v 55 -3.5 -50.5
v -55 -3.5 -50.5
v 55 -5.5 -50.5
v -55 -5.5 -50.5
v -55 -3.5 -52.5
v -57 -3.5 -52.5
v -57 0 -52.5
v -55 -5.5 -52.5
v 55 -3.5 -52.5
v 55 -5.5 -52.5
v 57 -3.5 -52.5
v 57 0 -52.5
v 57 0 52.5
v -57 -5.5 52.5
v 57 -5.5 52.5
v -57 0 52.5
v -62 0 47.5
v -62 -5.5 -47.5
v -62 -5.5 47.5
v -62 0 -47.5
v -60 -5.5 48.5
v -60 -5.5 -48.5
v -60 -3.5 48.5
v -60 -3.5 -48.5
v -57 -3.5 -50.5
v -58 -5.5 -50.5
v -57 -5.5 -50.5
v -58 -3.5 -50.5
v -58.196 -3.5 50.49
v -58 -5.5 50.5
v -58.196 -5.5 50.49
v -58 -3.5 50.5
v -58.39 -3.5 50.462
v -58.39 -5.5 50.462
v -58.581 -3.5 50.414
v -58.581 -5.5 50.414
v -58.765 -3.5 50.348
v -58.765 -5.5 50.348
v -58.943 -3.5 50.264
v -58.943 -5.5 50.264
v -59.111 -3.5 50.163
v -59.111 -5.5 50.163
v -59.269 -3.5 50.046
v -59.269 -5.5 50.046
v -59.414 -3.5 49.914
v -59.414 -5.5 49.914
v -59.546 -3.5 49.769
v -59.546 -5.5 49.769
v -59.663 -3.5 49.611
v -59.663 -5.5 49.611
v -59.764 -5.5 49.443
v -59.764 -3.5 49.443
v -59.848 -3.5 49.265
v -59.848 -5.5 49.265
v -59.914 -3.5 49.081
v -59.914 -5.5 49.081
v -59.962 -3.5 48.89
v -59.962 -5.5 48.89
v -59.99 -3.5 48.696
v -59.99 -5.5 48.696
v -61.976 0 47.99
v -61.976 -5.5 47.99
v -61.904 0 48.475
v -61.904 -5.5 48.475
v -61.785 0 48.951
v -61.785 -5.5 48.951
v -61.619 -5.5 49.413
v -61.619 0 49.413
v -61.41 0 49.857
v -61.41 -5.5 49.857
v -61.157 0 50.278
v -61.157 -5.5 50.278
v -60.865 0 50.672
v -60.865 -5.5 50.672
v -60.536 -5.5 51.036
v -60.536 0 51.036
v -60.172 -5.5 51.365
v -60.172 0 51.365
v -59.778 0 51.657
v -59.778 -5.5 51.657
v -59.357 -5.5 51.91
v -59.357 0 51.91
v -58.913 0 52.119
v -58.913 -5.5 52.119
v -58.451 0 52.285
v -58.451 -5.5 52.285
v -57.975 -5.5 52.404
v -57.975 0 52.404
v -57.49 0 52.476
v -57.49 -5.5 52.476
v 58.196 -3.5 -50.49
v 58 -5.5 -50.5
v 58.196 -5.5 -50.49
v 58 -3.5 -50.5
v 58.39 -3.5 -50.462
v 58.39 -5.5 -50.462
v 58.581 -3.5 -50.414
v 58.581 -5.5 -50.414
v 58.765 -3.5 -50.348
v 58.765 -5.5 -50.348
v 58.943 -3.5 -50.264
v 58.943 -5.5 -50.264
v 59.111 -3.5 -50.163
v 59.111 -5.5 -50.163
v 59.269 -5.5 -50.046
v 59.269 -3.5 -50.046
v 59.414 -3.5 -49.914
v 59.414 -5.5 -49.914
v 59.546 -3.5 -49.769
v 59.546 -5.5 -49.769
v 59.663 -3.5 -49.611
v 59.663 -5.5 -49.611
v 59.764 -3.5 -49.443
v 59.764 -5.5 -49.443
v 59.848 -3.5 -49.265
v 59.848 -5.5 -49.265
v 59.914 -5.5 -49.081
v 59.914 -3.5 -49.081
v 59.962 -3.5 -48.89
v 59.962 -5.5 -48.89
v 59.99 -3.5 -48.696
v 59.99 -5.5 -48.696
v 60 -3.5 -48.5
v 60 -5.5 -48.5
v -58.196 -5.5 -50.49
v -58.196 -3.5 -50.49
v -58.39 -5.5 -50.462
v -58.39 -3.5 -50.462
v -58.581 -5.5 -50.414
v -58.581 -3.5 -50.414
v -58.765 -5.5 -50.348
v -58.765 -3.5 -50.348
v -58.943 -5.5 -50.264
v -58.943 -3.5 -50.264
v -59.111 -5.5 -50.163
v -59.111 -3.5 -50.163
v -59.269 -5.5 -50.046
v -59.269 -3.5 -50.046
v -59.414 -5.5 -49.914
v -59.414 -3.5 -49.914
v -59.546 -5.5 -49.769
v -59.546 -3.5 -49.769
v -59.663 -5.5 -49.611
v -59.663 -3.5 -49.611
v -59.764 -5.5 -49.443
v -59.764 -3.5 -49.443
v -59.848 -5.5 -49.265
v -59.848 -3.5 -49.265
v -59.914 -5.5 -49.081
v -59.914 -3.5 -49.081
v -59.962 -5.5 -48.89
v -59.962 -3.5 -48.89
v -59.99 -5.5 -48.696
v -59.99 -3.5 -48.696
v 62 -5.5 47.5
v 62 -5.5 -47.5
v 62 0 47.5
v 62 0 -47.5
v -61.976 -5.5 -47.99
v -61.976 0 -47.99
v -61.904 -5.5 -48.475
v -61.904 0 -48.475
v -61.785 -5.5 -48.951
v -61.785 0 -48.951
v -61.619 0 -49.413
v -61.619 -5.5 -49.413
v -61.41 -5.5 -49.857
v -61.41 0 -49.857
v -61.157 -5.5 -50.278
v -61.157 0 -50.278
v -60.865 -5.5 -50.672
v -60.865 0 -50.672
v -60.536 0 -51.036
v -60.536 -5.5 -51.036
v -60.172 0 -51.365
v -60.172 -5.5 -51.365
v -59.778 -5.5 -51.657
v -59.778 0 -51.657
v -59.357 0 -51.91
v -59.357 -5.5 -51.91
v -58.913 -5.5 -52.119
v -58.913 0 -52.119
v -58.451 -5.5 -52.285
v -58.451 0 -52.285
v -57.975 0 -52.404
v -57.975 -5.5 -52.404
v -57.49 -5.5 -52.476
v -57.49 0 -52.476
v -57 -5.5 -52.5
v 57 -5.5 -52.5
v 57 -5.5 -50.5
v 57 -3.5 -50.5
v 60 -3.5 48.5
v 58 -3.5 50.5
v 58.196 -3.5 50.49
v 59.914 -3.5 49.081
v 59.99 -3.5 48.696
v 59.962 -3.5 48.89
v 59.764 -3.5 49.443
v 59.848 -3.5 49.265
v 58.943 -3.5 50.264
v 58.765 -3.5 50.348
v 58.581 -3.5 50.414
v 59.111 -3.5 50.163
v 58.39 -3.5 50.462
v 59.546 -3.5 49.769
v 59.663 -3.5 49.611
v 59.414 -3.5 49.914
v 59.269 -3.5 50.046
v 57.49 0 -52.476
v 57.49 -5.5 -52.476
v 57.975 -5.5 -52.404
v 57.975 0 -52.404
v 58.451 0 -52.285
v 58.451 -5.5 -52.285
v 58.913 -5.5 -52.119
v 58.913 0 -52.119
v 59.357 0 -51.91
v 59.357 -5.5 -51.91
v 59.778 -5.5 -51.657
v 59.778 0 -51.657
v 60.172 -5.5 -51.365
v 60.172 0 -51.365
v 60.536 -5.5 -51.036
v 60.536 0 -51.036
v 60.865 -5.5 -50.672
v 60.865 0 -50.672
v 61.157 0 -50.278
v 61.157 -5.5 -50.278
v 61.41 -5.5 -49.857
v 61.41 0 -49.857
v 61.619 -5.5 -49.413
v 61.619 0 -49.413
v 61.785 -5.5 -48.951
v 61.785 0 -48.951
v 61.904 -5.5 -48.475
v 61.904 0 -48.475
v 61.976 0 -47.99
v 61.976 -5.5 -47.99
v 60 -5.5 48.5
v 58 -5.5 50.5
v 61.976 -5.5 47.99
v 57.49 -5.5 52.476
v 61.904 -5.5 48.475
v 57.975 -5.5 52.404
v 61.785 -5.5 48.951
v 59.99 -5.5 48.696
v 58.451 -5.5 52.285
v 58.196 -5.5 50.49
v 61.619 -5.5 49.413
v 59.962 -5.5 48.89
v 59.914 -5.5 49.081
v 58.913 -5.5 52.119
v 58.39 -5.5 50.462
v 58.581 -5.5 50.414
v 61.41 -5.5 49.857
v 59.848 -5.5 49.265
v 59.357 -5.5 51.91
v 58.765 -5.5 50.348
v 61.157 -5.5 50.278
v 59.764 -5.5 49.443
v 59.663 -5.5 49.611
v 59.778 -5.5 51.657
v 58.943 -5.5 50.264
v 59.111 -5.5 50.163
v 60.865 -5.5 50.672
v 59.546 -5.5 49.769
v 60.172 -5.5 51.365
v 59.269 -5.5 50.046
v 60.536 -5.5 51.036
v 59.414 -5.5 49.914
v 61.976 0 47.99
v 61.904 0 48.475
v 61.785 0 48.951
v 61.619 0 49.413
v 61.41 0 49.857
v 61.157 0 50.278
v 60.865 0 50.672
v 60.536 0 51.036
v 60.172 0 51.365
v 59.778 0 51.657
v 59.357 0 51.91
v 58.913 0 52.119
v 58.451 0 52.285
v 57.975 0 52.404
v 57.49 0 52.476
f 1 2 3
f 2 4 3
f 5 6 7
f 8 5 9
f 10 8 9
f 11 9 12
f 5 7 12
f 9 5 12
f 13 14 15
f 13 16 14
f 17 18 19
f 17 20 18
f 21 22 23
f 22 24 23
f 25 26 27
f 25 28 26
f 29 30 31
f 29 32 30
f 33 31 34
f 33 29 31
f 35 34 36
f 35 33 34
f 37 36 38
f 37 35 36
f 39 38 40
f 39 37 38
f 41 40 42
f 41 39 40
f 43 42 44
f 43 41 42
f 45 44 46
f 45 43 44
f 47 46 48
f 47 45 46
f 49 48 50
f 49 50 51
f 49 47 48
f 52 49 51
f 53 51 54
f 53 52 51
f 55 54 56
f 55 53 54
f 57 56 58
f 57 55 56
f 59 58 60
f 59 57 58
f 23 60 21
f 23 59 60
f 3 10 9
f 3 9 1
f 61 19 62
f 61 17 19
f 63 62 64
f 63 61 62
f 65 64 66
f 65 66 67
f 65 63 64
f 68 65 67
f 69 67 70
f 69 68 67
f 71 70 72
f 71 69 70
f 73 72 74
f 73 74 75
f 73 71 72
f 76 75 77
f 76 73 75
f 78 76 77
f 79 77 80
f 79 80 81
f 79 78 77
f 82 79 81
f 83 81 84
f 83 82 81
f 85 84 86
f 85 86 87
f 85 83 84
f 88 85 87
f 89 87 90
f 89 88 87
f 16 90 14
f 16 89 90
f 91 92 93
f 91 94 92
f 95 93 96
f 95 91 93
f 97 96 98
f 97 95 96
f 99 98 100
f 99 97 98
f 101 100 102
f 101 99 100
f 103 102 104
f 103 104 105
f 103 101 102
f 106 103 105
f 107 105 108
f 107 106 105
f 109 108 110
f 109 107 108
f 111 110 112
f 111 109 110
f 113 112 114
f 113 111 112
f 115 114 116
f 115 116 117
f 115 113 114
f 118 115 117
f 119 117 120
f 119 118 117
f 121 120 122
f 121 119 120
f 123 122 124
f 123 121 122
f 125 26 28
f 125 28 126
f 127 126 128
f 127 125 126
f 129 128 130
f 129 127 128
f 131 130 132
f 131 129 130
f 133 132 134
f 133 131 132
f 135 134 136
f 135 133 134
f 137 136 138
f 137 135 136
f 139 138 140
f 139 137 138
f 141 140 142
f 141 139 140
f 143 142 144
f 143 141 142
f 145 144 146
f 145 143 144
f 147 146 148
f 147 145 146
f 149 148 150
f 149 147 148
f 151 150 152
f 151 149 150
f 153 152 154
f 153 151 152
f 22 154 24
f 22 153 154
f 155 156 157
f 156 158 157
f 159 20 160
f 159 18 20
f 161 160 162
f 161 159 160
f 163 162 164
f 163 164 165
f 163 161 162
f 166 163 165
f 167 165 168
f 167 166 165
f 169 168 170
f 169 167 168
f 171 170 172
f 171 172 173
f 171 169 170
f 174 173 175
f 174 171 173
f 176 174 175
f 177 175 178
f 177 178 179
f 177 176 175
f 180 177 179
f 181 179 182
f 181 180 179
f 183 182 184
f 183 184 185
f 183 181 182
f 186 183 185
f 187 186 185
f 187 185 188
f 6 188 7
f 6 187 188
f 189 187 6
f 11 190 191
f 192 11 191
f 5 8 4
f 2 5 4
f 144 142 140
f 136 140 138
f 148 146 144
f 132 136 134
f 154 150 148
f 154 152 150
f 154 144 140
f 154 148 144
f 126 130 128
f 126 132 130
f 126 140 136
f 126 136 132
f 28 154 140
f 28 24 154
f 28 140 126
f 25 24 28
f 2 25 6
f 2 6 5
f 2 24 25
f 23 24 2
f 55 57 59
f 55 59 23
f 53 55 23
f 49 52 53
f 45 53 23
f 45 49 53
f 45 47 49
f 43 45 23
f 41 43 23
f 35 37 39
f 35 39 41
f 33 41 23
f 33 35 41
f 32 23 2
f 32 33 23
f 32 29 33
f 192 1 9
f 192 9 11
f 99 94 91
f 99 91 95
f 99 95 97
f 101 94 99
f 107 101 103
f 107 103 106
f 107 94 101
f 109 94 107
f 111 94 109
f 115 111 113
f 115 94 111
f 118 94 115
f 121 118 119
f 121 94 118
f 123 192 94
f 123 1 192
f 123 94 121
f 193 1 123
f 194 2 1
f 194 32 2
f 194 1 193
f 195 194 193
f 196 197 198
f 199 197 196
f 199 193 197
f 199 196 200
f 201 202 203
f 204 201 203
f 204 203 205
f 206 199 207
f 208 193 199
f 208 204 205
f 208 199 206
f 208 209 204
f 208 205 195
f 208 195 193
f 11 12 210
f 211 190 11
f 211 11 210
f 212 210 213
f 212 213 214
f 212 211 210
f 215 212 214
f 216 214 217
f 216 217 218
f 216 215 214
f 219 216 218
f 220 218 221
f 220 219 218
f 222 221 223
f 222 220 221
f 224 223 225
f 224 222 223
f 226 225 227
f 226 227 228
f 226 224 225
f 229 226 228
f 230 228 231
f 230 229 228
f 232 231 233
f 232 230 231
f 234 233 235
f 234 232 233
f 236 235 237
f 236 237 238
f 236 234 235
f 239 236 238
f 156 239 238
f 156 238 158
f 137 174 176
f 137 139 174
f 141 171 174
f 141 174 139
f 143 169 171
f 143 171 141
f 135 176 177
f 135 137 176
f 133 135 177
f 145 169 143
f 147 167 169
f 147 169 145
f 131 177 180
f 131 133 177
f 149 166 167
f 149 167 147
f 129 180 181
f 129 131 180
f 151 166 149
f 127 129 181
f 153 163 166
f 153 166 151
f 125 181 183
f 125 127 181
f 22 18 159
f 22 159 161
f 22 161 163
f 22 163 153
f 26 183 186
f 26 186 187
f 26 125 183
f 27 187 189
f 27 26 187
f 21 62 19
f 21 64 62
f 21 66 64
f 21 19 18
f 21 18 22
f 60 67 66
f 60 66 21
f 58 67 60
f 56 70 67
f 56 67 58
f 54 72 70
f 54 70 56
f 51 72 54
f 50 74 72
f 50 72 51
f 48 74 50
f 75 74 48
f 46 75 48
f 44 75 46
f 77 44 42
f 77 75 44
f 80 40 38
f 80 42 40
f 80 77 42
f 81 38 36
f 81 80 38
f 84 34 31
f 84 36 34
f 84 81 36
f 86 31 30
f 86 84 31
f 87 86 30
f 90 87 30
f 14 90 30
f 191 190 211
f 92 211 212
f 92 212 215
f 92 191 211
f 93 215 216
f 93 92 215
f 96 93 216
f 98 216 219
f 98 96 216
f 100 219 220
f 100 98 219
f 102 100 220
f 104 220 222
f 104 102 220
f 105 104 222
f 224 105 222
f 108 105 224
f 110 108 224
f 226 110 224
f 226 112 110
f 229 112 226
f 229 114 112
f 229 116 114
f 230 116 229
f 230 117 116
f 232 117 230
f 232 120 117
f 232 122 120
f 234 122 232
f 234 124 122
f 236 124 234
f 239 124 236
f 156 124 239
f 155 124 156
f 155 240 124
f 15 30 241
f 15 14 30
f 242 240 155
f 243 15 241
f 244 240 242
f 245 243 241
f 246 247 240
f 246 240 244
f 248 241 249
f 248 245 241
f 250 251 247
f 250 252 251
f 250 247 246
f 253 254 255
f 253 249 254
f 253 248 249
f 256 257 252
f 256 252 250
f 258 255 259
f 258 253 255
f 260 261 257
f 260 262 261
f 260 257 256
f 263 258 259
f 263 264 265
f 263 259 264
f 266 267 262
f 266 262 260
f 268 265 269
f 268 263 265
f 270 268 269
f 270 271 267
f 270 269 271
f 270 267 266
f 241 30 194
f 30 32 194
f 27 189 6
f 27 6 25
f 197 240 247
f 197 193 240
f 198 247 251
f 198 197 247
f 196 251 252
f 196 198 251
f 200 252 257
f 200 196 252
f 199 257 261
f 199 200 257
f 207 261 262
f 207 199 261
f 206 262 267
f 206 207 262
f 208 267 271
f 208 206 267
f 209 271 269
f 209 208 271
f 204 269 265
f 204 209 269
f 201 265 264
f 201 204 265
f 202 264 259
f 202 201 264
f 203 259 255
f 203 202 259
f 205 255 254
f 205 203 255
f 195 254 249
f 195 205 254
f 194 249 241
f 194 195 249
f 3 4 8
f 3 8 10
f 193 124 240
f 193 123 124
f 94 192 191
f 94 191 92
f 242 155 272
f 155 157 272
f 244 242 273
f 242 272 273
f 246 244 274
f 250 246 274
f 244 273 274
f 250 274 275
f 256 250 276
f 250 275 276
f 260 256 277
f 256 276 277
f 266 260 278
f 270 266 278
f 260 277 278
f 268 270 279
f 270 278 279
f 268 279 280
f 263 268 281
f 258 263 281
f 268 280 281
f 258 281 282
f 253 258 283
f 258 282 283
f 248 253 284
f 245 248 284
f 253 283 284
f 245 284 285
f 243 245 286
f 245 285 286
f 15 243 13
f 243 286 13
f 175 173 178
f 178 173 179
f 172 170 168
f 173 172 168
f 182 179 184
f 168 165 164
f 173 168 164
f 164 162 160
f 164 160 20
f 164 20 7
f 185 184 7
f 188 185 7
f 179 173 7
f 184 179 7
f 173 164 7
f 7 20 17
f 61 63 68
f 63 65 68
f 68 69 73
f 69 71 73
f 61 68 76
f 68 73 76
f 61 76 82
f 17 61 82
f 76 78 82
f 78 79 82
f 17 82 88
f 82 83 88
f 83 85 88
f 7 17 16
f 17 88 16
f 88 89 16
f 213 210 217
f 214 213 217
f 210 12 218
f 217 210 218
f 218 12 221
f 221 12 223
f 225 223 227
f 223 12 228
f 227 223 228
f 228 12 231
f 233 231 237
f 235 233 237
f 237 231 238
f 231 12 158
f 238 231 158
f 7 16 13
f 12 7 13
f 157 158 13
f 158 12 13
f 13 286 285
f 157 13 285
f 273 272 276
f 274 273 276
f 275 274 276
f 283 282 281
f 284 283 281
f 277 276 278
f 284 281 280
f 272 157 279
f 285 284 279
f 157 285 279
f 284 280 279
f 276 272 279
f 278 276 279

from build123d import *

# Parameters (mm, degrees)
F0_W      = 120
F0_H      = 101
F1_DEPTH  = 4
F0_W_2    = 124
F0_H_2    = 105
F2_DEPTH  = 5
F3_DEPTH  = 0.5
F4_R      = 5
F5_R      = 2
F6_W      = 2
F6_H      = 2
F7_DEPTH  = 1.5
F8_W      = 2
F8_H      = 2
F9_DEPTH  = 1.5
F10_DEPTH = 0.5


with BuildPart() as f1:
    # F0 (on Front) → F1 (new body)
    with BuildSketch(Plane.XZ):
        Rectangle(F0_W, F0_H)
    extrude(amount=F1_DEPTH)

    # F0 (on Front) → F2 (join)
    with BuildSketch(Plane.XZ):
        Rectangle(F0_W_2, F0_H_2)
        Rectangle(F0_W, F0_H, mode=Mode.SUBTRACT)
    extrude(amount=F2_DEPTH)

    # F3 (add): a face of the model
    f3_faces = [f1.faces().sort_by_distance(p)[0] for p in [
        (0, -5, -50.8751615465),
    ]]
    extrude(f3_faces, amount=F3_DEPTH)

    # F4
    f4_edges = [f1.edges().sort_by_distance(p)[0] for p in [
        (62, -2.75, -52.5),
        (-62, -2.75, -52.5),
        (-62, -2.75, 52.5),
        (62, -2.75, 52.5),
    ]]
    fillet(f4_edges, radius=F4_R)

    # F5
    f5_edges = [f1.edges().sort_by_distance(p)[0] for p in [
        (60, -4.75, 50.5),
        (-60, -4.75, -50.5),
        (60, -4.75, -50.5),
        (-60, -4.75, 50.5),
    ]]
    fillet(f5_edges, radius=F5_R)

    # F6 (on face) → F7 (cut)
    with BuildSketch(Plane.XZ.offset(5.5)):
        with Locations((-56, -51.5)):
            Rectangle(F6_W, F6_H)
    extrude(amount=-F7_DEPTH, mode=Mode.SUBTRACT)

    # F8 (on face) → F9 (cut)
    with BuildSketch(Plane.XZ.offset(5.5)):
        with Locations((56, -51.5)):
            Rectangle(F8_W, F8_H)
    extrude(amount=-F9_DEPTH, mode=Mode.SUBTRACT)

    # F10 (cut): a face of the model
    f10_faces = [f1.faces().sort_by_distance(p)[0] for p in [
        (0, -4, -0.0339805967),
    ]]
    extrude(f10_faces, amount=-F10_DEPTH, mode=Mode.SUBTRACT)


solid = f1.part
